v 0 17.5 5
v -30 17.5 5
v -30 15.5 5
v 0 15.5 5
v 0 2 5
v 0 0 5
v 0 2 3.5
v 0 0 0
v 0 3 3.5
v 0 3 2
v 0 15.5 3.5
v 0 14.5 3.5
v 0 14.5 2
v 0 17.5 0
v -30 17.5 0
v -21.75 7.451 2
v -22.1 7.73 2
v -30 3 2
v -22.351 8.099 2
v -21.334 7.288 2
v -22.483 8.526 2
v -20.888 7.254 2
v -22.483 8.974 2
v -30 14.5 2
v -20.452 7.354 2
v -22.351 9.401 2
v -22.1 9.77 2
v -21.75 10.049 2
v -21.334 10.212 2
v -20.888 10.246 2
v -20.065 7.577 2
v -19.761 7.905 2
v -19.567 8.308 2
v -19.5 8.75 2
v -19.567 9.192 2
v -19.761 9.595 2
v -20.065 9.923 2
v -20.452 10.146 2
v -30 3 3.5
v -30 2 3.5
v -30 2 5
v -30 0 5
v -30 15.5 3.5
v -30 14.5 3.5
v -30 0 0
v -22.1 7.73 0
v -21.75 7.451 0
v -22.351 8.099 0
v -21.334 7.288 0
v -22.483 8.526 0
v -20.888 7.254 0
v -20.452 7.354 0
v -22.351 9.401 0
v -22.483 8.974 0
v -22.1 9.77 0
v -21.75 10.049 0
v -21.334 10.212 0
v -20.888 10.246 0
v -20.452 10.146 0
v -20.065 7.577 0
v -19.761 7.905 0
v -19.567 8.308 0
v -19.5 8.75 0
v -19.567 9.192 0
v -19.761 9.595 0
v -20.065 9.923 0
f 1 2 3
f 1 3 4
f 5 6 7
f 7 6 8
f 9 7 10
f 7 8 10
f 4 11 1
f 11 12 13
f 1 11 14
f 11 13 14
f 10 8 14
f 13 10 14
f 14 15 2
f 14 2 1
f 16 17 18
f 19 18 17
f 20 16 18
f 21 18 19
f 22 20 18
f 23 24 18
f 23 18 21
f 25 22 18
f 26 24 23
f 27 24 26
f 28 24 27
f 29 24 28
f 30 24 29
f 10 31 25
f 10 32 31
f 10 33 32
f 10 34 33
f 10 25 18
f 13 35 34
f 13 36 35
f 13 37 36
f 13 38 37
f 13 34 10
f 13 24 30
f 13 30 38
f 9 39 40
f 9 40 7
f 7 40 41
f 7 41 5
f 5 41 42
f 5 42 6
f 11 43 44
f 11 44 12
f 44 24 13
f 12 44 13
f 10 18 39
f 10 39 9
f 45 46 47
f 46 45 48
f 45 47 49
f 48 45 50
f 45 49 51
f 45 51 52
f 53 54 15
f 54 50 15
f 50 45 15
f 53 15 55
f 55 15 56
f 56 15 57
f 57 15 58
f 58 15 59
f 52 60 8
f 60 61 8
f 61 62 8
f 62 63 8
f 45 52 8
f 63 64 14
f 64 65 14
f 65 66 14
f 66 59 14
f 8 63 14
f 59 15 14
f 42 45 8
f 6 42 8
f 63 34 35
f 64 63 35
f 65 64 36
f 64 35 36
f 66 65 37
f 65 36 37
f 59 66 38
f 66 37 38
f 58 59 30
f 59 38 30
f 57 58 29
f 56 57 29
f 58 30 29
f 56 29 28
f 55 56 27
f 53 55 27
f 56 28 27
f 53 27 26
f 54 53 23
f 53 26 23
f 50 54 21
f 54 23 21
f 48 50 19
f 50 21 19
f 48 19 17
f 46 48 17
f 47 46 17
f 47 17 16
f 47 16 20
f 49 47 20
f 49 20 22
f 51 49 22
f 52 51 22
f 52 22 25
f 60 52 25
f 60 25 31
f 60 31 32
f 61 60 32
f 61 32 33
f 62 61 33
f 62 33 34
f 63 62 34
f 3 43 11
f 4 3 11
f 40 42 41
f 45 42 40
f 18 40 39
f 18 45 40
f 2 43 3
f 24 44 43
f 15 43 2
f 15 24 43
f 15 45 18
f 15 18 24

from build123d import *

# Parameters (mm, degrees)
F0_W     = 30
F0_H     = 17.5
F1_DEPTH = 2
F2_R     = 1.5
F3_DEPTH = 25
F4_W     = 30
F4_H     = 2
F5_DEPTH = 3
F6_W     = 30
F6_H     = 1
F7_DEPTH = 1.5


with BuildPart() as f1:
    # F0 (on Top) → F1 (new body)
    with BuildSketch(Plane.XY):
        with Locations((-15, 8.75)):
            Rectangle(F0_W, F0_H)
    extrude(amount=F1_DEPTH)

    # F2 (on face) → F3 (cut)
    with BuildSketch(Plane.XY.offset(2)):
        with Locations((-21, 8.75)):
            Circle(F2_R)
    extrude(amount=-F3_DEPTH, mode=Mode.SUBTRACT)

    # F4 (on face) → F5 (join)
    with BuildSketch(Plane.XY.offset(2)):
        with Locations((-15, 16.5)):
            Rectangle(F4_W, F4_H)
        with Locations((-15, 1)):
            Rectangle(F4_W, F4_H)
    extrude(amount=F5_DEPTH)

    # F6 (on face) → F7 (join)
    with BuildSketch(Plane.XY.offset(2)):
        with Locations((-15, 15)):
            Rectangle(F6_W, F6_H)
        with Locations((-15, 2.5)):
            Rectangle(F6_W, F6_H)
    extrude(amount=F7_DEPTH)


solid = f1.part
